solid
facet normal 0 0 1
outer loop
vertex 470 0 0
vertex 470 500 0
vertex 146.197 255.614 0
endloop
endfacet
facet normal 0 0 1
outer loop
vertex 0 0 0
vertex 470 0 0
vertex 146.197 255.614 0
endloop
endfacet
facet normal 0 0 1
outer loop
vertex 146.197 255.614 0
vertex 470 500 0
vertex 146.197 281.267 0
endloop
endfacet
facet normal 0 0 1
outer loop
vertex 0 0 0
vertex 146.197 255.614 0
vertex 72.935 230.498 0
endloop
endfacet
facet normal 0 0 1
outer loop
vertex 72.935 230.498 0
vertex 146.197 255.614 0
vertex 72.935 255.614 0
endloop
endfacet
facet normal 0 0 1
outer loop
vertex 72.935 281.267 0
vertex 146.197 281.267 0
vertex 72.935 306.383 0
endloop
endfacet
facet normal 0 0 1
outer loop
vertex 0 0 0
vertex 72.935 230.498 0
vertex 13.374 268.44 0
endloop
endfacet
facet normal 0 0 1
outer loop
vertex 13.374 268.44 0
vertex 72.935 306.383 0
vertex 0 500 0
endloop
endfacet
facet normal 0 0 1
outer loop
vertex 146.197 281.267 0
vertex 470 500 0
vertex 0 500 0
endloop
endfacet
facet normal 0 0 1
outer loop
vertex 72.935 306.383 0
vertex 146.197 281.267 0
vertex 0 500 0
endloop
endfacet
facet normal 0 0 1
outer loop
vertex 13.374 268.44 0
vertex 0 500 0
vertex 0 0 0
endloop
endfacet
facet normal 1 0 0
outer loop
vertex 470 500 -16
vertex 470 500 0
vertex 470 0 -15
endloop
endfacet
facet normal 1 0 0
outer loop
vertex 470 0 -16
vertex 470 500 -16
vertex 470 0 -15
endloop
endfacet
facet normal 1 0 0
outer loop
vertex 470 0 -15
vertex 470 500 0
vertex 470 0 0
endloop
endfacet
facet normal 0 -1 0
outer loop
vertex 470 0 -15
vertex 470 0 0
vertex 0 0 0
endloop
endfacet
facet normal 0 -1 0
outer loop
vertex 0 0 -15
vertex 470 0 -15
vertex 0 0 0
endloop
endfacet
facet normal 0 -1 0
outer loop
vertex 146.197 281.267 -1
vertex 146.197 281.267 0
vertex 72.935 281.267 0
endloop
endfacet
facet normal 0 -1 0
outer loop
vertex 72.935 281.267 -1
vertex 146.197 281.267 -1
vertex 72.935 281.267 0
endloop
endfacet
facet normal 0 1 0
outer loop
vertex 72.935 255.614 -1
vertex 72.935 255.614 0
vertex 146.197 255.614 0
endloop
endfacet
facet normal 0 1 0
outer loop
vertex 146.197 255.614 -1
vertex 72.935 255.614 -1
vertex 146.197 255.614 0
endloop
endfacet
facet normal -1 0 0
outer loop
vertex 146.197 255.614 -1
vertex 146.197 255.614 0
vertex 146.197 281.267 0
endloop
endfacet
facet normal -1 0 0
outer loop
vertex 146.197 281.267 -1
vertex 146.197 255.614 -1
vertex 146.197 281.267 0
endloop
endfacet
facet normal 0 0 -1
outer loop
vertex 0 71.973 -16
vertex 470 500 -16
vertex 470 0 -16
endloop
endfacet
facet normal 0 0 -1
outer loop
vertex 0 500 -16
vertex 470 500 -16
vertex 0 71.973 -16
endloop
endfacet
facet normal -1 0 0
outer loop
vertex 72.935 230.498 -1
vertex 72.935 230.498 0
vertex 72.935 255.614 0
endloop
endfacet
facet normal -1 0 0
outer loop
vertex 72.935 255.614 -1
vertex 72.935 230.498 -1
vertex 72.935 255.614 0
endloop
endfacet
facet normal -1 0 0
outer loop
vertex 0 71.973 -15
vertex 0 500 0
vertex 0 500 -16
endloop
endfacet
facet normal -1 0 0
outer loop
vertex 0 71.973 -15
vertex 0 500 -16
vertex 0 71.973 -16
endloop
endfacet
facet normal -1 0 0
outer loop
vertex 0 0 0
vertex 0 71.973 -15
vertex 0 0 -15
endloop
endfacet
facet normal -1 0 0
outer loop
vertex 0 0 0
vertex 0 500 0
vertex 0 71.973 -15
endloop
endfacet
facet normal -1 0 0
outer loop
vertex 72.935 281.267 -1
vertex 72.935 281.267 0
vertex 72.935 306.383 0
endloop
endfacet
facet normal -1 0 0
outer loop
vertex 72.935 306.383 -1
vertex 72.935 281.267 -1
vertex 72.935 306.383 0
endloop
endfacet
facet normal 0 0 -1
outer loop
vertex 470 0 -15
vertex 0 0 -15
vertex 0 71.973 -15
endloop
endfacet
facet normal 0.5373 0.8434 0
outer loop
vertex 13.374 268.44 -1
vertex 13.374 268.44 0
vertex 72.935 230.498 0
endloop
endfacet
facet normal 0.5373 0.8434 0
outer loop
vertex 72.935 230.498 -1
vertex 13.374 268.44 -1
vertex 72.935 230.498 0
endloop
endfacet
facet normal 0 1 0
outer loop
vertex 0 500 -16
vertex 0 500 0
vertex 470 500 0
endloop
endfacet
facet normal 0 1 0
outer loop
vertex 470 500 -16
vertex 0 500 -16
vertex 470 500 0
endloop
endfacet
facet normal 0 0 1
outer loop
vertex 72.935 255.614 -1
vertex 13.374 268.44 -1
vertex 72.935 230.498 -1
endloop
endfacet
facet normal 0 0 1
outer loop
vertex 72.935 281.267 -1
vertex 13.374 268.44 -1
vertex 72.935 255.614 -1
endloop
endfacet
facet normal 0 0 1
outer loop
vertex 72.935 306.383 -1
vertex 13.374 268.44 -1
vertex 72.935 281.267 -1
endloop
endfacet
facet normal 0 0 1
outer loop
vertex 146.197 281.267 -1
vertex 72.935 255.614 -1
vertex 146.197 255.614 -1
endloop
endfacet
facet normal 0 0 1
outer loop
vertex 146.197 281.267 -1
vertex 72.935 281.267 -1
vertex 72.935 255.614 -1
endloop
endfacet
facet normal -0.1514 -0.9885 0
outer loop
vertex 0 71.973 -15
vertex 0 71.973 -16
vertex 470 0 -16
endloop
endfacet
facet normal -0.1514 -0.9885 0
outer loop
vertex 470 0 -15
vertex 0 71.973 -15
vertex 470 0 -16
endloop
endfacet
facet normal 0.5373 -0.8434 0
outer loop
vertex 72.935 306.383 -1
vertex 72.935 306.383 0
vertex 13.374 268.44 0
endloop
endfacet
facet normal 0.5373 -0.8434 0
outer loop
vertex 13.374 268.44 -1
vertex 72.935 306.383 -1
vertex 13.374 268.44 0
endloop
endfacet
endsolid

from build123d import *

# Parameters (mm, degrees)
PAD_DEPTH       = 16
POCKET_DEPTH    = 1
POCKET001_DEPTH = 1


with BuildPart() as part:
    # Sketch → Pad (new body)
    with BuildSketch(Plane.XY):
        Polygon((0, 413.879036), (0, 500), (470, 500), (470, 0), (0, 0), align=None)
    extrude(amount=-PAD_DEPTH)

    # Sketch002 (on Face7 of Pad) → Pocket (cut)
    with BuildSketch(Plane(origin=(0, 0, -16), x_dir=(1, 0, 0), z_dir=(0, 0, -1))):
        Polygon((0, 0), (0, -71.973152), (470, 0), align=None)
    extrude(amount=-POCKET_DEPTH, mode=Mode.SUBTRACT)

    # Sketch003 (on Face4 of Pocket) → Pocket001 (cut)
    with BuildSketch(Plane.XY):
        Polygon((72.935243, 306.382776), (13.373917, 268.440454), (72.935243, 230.498132), (72.935243, 255.613788), (146.197296, 255.613788), (146.197296, 281.26712), (72.935243, 281.26712), align=None)
    extrude(amount=-POCKET001_DEPTH, mode=Mode.SUBTRACT)


solid = part.part
